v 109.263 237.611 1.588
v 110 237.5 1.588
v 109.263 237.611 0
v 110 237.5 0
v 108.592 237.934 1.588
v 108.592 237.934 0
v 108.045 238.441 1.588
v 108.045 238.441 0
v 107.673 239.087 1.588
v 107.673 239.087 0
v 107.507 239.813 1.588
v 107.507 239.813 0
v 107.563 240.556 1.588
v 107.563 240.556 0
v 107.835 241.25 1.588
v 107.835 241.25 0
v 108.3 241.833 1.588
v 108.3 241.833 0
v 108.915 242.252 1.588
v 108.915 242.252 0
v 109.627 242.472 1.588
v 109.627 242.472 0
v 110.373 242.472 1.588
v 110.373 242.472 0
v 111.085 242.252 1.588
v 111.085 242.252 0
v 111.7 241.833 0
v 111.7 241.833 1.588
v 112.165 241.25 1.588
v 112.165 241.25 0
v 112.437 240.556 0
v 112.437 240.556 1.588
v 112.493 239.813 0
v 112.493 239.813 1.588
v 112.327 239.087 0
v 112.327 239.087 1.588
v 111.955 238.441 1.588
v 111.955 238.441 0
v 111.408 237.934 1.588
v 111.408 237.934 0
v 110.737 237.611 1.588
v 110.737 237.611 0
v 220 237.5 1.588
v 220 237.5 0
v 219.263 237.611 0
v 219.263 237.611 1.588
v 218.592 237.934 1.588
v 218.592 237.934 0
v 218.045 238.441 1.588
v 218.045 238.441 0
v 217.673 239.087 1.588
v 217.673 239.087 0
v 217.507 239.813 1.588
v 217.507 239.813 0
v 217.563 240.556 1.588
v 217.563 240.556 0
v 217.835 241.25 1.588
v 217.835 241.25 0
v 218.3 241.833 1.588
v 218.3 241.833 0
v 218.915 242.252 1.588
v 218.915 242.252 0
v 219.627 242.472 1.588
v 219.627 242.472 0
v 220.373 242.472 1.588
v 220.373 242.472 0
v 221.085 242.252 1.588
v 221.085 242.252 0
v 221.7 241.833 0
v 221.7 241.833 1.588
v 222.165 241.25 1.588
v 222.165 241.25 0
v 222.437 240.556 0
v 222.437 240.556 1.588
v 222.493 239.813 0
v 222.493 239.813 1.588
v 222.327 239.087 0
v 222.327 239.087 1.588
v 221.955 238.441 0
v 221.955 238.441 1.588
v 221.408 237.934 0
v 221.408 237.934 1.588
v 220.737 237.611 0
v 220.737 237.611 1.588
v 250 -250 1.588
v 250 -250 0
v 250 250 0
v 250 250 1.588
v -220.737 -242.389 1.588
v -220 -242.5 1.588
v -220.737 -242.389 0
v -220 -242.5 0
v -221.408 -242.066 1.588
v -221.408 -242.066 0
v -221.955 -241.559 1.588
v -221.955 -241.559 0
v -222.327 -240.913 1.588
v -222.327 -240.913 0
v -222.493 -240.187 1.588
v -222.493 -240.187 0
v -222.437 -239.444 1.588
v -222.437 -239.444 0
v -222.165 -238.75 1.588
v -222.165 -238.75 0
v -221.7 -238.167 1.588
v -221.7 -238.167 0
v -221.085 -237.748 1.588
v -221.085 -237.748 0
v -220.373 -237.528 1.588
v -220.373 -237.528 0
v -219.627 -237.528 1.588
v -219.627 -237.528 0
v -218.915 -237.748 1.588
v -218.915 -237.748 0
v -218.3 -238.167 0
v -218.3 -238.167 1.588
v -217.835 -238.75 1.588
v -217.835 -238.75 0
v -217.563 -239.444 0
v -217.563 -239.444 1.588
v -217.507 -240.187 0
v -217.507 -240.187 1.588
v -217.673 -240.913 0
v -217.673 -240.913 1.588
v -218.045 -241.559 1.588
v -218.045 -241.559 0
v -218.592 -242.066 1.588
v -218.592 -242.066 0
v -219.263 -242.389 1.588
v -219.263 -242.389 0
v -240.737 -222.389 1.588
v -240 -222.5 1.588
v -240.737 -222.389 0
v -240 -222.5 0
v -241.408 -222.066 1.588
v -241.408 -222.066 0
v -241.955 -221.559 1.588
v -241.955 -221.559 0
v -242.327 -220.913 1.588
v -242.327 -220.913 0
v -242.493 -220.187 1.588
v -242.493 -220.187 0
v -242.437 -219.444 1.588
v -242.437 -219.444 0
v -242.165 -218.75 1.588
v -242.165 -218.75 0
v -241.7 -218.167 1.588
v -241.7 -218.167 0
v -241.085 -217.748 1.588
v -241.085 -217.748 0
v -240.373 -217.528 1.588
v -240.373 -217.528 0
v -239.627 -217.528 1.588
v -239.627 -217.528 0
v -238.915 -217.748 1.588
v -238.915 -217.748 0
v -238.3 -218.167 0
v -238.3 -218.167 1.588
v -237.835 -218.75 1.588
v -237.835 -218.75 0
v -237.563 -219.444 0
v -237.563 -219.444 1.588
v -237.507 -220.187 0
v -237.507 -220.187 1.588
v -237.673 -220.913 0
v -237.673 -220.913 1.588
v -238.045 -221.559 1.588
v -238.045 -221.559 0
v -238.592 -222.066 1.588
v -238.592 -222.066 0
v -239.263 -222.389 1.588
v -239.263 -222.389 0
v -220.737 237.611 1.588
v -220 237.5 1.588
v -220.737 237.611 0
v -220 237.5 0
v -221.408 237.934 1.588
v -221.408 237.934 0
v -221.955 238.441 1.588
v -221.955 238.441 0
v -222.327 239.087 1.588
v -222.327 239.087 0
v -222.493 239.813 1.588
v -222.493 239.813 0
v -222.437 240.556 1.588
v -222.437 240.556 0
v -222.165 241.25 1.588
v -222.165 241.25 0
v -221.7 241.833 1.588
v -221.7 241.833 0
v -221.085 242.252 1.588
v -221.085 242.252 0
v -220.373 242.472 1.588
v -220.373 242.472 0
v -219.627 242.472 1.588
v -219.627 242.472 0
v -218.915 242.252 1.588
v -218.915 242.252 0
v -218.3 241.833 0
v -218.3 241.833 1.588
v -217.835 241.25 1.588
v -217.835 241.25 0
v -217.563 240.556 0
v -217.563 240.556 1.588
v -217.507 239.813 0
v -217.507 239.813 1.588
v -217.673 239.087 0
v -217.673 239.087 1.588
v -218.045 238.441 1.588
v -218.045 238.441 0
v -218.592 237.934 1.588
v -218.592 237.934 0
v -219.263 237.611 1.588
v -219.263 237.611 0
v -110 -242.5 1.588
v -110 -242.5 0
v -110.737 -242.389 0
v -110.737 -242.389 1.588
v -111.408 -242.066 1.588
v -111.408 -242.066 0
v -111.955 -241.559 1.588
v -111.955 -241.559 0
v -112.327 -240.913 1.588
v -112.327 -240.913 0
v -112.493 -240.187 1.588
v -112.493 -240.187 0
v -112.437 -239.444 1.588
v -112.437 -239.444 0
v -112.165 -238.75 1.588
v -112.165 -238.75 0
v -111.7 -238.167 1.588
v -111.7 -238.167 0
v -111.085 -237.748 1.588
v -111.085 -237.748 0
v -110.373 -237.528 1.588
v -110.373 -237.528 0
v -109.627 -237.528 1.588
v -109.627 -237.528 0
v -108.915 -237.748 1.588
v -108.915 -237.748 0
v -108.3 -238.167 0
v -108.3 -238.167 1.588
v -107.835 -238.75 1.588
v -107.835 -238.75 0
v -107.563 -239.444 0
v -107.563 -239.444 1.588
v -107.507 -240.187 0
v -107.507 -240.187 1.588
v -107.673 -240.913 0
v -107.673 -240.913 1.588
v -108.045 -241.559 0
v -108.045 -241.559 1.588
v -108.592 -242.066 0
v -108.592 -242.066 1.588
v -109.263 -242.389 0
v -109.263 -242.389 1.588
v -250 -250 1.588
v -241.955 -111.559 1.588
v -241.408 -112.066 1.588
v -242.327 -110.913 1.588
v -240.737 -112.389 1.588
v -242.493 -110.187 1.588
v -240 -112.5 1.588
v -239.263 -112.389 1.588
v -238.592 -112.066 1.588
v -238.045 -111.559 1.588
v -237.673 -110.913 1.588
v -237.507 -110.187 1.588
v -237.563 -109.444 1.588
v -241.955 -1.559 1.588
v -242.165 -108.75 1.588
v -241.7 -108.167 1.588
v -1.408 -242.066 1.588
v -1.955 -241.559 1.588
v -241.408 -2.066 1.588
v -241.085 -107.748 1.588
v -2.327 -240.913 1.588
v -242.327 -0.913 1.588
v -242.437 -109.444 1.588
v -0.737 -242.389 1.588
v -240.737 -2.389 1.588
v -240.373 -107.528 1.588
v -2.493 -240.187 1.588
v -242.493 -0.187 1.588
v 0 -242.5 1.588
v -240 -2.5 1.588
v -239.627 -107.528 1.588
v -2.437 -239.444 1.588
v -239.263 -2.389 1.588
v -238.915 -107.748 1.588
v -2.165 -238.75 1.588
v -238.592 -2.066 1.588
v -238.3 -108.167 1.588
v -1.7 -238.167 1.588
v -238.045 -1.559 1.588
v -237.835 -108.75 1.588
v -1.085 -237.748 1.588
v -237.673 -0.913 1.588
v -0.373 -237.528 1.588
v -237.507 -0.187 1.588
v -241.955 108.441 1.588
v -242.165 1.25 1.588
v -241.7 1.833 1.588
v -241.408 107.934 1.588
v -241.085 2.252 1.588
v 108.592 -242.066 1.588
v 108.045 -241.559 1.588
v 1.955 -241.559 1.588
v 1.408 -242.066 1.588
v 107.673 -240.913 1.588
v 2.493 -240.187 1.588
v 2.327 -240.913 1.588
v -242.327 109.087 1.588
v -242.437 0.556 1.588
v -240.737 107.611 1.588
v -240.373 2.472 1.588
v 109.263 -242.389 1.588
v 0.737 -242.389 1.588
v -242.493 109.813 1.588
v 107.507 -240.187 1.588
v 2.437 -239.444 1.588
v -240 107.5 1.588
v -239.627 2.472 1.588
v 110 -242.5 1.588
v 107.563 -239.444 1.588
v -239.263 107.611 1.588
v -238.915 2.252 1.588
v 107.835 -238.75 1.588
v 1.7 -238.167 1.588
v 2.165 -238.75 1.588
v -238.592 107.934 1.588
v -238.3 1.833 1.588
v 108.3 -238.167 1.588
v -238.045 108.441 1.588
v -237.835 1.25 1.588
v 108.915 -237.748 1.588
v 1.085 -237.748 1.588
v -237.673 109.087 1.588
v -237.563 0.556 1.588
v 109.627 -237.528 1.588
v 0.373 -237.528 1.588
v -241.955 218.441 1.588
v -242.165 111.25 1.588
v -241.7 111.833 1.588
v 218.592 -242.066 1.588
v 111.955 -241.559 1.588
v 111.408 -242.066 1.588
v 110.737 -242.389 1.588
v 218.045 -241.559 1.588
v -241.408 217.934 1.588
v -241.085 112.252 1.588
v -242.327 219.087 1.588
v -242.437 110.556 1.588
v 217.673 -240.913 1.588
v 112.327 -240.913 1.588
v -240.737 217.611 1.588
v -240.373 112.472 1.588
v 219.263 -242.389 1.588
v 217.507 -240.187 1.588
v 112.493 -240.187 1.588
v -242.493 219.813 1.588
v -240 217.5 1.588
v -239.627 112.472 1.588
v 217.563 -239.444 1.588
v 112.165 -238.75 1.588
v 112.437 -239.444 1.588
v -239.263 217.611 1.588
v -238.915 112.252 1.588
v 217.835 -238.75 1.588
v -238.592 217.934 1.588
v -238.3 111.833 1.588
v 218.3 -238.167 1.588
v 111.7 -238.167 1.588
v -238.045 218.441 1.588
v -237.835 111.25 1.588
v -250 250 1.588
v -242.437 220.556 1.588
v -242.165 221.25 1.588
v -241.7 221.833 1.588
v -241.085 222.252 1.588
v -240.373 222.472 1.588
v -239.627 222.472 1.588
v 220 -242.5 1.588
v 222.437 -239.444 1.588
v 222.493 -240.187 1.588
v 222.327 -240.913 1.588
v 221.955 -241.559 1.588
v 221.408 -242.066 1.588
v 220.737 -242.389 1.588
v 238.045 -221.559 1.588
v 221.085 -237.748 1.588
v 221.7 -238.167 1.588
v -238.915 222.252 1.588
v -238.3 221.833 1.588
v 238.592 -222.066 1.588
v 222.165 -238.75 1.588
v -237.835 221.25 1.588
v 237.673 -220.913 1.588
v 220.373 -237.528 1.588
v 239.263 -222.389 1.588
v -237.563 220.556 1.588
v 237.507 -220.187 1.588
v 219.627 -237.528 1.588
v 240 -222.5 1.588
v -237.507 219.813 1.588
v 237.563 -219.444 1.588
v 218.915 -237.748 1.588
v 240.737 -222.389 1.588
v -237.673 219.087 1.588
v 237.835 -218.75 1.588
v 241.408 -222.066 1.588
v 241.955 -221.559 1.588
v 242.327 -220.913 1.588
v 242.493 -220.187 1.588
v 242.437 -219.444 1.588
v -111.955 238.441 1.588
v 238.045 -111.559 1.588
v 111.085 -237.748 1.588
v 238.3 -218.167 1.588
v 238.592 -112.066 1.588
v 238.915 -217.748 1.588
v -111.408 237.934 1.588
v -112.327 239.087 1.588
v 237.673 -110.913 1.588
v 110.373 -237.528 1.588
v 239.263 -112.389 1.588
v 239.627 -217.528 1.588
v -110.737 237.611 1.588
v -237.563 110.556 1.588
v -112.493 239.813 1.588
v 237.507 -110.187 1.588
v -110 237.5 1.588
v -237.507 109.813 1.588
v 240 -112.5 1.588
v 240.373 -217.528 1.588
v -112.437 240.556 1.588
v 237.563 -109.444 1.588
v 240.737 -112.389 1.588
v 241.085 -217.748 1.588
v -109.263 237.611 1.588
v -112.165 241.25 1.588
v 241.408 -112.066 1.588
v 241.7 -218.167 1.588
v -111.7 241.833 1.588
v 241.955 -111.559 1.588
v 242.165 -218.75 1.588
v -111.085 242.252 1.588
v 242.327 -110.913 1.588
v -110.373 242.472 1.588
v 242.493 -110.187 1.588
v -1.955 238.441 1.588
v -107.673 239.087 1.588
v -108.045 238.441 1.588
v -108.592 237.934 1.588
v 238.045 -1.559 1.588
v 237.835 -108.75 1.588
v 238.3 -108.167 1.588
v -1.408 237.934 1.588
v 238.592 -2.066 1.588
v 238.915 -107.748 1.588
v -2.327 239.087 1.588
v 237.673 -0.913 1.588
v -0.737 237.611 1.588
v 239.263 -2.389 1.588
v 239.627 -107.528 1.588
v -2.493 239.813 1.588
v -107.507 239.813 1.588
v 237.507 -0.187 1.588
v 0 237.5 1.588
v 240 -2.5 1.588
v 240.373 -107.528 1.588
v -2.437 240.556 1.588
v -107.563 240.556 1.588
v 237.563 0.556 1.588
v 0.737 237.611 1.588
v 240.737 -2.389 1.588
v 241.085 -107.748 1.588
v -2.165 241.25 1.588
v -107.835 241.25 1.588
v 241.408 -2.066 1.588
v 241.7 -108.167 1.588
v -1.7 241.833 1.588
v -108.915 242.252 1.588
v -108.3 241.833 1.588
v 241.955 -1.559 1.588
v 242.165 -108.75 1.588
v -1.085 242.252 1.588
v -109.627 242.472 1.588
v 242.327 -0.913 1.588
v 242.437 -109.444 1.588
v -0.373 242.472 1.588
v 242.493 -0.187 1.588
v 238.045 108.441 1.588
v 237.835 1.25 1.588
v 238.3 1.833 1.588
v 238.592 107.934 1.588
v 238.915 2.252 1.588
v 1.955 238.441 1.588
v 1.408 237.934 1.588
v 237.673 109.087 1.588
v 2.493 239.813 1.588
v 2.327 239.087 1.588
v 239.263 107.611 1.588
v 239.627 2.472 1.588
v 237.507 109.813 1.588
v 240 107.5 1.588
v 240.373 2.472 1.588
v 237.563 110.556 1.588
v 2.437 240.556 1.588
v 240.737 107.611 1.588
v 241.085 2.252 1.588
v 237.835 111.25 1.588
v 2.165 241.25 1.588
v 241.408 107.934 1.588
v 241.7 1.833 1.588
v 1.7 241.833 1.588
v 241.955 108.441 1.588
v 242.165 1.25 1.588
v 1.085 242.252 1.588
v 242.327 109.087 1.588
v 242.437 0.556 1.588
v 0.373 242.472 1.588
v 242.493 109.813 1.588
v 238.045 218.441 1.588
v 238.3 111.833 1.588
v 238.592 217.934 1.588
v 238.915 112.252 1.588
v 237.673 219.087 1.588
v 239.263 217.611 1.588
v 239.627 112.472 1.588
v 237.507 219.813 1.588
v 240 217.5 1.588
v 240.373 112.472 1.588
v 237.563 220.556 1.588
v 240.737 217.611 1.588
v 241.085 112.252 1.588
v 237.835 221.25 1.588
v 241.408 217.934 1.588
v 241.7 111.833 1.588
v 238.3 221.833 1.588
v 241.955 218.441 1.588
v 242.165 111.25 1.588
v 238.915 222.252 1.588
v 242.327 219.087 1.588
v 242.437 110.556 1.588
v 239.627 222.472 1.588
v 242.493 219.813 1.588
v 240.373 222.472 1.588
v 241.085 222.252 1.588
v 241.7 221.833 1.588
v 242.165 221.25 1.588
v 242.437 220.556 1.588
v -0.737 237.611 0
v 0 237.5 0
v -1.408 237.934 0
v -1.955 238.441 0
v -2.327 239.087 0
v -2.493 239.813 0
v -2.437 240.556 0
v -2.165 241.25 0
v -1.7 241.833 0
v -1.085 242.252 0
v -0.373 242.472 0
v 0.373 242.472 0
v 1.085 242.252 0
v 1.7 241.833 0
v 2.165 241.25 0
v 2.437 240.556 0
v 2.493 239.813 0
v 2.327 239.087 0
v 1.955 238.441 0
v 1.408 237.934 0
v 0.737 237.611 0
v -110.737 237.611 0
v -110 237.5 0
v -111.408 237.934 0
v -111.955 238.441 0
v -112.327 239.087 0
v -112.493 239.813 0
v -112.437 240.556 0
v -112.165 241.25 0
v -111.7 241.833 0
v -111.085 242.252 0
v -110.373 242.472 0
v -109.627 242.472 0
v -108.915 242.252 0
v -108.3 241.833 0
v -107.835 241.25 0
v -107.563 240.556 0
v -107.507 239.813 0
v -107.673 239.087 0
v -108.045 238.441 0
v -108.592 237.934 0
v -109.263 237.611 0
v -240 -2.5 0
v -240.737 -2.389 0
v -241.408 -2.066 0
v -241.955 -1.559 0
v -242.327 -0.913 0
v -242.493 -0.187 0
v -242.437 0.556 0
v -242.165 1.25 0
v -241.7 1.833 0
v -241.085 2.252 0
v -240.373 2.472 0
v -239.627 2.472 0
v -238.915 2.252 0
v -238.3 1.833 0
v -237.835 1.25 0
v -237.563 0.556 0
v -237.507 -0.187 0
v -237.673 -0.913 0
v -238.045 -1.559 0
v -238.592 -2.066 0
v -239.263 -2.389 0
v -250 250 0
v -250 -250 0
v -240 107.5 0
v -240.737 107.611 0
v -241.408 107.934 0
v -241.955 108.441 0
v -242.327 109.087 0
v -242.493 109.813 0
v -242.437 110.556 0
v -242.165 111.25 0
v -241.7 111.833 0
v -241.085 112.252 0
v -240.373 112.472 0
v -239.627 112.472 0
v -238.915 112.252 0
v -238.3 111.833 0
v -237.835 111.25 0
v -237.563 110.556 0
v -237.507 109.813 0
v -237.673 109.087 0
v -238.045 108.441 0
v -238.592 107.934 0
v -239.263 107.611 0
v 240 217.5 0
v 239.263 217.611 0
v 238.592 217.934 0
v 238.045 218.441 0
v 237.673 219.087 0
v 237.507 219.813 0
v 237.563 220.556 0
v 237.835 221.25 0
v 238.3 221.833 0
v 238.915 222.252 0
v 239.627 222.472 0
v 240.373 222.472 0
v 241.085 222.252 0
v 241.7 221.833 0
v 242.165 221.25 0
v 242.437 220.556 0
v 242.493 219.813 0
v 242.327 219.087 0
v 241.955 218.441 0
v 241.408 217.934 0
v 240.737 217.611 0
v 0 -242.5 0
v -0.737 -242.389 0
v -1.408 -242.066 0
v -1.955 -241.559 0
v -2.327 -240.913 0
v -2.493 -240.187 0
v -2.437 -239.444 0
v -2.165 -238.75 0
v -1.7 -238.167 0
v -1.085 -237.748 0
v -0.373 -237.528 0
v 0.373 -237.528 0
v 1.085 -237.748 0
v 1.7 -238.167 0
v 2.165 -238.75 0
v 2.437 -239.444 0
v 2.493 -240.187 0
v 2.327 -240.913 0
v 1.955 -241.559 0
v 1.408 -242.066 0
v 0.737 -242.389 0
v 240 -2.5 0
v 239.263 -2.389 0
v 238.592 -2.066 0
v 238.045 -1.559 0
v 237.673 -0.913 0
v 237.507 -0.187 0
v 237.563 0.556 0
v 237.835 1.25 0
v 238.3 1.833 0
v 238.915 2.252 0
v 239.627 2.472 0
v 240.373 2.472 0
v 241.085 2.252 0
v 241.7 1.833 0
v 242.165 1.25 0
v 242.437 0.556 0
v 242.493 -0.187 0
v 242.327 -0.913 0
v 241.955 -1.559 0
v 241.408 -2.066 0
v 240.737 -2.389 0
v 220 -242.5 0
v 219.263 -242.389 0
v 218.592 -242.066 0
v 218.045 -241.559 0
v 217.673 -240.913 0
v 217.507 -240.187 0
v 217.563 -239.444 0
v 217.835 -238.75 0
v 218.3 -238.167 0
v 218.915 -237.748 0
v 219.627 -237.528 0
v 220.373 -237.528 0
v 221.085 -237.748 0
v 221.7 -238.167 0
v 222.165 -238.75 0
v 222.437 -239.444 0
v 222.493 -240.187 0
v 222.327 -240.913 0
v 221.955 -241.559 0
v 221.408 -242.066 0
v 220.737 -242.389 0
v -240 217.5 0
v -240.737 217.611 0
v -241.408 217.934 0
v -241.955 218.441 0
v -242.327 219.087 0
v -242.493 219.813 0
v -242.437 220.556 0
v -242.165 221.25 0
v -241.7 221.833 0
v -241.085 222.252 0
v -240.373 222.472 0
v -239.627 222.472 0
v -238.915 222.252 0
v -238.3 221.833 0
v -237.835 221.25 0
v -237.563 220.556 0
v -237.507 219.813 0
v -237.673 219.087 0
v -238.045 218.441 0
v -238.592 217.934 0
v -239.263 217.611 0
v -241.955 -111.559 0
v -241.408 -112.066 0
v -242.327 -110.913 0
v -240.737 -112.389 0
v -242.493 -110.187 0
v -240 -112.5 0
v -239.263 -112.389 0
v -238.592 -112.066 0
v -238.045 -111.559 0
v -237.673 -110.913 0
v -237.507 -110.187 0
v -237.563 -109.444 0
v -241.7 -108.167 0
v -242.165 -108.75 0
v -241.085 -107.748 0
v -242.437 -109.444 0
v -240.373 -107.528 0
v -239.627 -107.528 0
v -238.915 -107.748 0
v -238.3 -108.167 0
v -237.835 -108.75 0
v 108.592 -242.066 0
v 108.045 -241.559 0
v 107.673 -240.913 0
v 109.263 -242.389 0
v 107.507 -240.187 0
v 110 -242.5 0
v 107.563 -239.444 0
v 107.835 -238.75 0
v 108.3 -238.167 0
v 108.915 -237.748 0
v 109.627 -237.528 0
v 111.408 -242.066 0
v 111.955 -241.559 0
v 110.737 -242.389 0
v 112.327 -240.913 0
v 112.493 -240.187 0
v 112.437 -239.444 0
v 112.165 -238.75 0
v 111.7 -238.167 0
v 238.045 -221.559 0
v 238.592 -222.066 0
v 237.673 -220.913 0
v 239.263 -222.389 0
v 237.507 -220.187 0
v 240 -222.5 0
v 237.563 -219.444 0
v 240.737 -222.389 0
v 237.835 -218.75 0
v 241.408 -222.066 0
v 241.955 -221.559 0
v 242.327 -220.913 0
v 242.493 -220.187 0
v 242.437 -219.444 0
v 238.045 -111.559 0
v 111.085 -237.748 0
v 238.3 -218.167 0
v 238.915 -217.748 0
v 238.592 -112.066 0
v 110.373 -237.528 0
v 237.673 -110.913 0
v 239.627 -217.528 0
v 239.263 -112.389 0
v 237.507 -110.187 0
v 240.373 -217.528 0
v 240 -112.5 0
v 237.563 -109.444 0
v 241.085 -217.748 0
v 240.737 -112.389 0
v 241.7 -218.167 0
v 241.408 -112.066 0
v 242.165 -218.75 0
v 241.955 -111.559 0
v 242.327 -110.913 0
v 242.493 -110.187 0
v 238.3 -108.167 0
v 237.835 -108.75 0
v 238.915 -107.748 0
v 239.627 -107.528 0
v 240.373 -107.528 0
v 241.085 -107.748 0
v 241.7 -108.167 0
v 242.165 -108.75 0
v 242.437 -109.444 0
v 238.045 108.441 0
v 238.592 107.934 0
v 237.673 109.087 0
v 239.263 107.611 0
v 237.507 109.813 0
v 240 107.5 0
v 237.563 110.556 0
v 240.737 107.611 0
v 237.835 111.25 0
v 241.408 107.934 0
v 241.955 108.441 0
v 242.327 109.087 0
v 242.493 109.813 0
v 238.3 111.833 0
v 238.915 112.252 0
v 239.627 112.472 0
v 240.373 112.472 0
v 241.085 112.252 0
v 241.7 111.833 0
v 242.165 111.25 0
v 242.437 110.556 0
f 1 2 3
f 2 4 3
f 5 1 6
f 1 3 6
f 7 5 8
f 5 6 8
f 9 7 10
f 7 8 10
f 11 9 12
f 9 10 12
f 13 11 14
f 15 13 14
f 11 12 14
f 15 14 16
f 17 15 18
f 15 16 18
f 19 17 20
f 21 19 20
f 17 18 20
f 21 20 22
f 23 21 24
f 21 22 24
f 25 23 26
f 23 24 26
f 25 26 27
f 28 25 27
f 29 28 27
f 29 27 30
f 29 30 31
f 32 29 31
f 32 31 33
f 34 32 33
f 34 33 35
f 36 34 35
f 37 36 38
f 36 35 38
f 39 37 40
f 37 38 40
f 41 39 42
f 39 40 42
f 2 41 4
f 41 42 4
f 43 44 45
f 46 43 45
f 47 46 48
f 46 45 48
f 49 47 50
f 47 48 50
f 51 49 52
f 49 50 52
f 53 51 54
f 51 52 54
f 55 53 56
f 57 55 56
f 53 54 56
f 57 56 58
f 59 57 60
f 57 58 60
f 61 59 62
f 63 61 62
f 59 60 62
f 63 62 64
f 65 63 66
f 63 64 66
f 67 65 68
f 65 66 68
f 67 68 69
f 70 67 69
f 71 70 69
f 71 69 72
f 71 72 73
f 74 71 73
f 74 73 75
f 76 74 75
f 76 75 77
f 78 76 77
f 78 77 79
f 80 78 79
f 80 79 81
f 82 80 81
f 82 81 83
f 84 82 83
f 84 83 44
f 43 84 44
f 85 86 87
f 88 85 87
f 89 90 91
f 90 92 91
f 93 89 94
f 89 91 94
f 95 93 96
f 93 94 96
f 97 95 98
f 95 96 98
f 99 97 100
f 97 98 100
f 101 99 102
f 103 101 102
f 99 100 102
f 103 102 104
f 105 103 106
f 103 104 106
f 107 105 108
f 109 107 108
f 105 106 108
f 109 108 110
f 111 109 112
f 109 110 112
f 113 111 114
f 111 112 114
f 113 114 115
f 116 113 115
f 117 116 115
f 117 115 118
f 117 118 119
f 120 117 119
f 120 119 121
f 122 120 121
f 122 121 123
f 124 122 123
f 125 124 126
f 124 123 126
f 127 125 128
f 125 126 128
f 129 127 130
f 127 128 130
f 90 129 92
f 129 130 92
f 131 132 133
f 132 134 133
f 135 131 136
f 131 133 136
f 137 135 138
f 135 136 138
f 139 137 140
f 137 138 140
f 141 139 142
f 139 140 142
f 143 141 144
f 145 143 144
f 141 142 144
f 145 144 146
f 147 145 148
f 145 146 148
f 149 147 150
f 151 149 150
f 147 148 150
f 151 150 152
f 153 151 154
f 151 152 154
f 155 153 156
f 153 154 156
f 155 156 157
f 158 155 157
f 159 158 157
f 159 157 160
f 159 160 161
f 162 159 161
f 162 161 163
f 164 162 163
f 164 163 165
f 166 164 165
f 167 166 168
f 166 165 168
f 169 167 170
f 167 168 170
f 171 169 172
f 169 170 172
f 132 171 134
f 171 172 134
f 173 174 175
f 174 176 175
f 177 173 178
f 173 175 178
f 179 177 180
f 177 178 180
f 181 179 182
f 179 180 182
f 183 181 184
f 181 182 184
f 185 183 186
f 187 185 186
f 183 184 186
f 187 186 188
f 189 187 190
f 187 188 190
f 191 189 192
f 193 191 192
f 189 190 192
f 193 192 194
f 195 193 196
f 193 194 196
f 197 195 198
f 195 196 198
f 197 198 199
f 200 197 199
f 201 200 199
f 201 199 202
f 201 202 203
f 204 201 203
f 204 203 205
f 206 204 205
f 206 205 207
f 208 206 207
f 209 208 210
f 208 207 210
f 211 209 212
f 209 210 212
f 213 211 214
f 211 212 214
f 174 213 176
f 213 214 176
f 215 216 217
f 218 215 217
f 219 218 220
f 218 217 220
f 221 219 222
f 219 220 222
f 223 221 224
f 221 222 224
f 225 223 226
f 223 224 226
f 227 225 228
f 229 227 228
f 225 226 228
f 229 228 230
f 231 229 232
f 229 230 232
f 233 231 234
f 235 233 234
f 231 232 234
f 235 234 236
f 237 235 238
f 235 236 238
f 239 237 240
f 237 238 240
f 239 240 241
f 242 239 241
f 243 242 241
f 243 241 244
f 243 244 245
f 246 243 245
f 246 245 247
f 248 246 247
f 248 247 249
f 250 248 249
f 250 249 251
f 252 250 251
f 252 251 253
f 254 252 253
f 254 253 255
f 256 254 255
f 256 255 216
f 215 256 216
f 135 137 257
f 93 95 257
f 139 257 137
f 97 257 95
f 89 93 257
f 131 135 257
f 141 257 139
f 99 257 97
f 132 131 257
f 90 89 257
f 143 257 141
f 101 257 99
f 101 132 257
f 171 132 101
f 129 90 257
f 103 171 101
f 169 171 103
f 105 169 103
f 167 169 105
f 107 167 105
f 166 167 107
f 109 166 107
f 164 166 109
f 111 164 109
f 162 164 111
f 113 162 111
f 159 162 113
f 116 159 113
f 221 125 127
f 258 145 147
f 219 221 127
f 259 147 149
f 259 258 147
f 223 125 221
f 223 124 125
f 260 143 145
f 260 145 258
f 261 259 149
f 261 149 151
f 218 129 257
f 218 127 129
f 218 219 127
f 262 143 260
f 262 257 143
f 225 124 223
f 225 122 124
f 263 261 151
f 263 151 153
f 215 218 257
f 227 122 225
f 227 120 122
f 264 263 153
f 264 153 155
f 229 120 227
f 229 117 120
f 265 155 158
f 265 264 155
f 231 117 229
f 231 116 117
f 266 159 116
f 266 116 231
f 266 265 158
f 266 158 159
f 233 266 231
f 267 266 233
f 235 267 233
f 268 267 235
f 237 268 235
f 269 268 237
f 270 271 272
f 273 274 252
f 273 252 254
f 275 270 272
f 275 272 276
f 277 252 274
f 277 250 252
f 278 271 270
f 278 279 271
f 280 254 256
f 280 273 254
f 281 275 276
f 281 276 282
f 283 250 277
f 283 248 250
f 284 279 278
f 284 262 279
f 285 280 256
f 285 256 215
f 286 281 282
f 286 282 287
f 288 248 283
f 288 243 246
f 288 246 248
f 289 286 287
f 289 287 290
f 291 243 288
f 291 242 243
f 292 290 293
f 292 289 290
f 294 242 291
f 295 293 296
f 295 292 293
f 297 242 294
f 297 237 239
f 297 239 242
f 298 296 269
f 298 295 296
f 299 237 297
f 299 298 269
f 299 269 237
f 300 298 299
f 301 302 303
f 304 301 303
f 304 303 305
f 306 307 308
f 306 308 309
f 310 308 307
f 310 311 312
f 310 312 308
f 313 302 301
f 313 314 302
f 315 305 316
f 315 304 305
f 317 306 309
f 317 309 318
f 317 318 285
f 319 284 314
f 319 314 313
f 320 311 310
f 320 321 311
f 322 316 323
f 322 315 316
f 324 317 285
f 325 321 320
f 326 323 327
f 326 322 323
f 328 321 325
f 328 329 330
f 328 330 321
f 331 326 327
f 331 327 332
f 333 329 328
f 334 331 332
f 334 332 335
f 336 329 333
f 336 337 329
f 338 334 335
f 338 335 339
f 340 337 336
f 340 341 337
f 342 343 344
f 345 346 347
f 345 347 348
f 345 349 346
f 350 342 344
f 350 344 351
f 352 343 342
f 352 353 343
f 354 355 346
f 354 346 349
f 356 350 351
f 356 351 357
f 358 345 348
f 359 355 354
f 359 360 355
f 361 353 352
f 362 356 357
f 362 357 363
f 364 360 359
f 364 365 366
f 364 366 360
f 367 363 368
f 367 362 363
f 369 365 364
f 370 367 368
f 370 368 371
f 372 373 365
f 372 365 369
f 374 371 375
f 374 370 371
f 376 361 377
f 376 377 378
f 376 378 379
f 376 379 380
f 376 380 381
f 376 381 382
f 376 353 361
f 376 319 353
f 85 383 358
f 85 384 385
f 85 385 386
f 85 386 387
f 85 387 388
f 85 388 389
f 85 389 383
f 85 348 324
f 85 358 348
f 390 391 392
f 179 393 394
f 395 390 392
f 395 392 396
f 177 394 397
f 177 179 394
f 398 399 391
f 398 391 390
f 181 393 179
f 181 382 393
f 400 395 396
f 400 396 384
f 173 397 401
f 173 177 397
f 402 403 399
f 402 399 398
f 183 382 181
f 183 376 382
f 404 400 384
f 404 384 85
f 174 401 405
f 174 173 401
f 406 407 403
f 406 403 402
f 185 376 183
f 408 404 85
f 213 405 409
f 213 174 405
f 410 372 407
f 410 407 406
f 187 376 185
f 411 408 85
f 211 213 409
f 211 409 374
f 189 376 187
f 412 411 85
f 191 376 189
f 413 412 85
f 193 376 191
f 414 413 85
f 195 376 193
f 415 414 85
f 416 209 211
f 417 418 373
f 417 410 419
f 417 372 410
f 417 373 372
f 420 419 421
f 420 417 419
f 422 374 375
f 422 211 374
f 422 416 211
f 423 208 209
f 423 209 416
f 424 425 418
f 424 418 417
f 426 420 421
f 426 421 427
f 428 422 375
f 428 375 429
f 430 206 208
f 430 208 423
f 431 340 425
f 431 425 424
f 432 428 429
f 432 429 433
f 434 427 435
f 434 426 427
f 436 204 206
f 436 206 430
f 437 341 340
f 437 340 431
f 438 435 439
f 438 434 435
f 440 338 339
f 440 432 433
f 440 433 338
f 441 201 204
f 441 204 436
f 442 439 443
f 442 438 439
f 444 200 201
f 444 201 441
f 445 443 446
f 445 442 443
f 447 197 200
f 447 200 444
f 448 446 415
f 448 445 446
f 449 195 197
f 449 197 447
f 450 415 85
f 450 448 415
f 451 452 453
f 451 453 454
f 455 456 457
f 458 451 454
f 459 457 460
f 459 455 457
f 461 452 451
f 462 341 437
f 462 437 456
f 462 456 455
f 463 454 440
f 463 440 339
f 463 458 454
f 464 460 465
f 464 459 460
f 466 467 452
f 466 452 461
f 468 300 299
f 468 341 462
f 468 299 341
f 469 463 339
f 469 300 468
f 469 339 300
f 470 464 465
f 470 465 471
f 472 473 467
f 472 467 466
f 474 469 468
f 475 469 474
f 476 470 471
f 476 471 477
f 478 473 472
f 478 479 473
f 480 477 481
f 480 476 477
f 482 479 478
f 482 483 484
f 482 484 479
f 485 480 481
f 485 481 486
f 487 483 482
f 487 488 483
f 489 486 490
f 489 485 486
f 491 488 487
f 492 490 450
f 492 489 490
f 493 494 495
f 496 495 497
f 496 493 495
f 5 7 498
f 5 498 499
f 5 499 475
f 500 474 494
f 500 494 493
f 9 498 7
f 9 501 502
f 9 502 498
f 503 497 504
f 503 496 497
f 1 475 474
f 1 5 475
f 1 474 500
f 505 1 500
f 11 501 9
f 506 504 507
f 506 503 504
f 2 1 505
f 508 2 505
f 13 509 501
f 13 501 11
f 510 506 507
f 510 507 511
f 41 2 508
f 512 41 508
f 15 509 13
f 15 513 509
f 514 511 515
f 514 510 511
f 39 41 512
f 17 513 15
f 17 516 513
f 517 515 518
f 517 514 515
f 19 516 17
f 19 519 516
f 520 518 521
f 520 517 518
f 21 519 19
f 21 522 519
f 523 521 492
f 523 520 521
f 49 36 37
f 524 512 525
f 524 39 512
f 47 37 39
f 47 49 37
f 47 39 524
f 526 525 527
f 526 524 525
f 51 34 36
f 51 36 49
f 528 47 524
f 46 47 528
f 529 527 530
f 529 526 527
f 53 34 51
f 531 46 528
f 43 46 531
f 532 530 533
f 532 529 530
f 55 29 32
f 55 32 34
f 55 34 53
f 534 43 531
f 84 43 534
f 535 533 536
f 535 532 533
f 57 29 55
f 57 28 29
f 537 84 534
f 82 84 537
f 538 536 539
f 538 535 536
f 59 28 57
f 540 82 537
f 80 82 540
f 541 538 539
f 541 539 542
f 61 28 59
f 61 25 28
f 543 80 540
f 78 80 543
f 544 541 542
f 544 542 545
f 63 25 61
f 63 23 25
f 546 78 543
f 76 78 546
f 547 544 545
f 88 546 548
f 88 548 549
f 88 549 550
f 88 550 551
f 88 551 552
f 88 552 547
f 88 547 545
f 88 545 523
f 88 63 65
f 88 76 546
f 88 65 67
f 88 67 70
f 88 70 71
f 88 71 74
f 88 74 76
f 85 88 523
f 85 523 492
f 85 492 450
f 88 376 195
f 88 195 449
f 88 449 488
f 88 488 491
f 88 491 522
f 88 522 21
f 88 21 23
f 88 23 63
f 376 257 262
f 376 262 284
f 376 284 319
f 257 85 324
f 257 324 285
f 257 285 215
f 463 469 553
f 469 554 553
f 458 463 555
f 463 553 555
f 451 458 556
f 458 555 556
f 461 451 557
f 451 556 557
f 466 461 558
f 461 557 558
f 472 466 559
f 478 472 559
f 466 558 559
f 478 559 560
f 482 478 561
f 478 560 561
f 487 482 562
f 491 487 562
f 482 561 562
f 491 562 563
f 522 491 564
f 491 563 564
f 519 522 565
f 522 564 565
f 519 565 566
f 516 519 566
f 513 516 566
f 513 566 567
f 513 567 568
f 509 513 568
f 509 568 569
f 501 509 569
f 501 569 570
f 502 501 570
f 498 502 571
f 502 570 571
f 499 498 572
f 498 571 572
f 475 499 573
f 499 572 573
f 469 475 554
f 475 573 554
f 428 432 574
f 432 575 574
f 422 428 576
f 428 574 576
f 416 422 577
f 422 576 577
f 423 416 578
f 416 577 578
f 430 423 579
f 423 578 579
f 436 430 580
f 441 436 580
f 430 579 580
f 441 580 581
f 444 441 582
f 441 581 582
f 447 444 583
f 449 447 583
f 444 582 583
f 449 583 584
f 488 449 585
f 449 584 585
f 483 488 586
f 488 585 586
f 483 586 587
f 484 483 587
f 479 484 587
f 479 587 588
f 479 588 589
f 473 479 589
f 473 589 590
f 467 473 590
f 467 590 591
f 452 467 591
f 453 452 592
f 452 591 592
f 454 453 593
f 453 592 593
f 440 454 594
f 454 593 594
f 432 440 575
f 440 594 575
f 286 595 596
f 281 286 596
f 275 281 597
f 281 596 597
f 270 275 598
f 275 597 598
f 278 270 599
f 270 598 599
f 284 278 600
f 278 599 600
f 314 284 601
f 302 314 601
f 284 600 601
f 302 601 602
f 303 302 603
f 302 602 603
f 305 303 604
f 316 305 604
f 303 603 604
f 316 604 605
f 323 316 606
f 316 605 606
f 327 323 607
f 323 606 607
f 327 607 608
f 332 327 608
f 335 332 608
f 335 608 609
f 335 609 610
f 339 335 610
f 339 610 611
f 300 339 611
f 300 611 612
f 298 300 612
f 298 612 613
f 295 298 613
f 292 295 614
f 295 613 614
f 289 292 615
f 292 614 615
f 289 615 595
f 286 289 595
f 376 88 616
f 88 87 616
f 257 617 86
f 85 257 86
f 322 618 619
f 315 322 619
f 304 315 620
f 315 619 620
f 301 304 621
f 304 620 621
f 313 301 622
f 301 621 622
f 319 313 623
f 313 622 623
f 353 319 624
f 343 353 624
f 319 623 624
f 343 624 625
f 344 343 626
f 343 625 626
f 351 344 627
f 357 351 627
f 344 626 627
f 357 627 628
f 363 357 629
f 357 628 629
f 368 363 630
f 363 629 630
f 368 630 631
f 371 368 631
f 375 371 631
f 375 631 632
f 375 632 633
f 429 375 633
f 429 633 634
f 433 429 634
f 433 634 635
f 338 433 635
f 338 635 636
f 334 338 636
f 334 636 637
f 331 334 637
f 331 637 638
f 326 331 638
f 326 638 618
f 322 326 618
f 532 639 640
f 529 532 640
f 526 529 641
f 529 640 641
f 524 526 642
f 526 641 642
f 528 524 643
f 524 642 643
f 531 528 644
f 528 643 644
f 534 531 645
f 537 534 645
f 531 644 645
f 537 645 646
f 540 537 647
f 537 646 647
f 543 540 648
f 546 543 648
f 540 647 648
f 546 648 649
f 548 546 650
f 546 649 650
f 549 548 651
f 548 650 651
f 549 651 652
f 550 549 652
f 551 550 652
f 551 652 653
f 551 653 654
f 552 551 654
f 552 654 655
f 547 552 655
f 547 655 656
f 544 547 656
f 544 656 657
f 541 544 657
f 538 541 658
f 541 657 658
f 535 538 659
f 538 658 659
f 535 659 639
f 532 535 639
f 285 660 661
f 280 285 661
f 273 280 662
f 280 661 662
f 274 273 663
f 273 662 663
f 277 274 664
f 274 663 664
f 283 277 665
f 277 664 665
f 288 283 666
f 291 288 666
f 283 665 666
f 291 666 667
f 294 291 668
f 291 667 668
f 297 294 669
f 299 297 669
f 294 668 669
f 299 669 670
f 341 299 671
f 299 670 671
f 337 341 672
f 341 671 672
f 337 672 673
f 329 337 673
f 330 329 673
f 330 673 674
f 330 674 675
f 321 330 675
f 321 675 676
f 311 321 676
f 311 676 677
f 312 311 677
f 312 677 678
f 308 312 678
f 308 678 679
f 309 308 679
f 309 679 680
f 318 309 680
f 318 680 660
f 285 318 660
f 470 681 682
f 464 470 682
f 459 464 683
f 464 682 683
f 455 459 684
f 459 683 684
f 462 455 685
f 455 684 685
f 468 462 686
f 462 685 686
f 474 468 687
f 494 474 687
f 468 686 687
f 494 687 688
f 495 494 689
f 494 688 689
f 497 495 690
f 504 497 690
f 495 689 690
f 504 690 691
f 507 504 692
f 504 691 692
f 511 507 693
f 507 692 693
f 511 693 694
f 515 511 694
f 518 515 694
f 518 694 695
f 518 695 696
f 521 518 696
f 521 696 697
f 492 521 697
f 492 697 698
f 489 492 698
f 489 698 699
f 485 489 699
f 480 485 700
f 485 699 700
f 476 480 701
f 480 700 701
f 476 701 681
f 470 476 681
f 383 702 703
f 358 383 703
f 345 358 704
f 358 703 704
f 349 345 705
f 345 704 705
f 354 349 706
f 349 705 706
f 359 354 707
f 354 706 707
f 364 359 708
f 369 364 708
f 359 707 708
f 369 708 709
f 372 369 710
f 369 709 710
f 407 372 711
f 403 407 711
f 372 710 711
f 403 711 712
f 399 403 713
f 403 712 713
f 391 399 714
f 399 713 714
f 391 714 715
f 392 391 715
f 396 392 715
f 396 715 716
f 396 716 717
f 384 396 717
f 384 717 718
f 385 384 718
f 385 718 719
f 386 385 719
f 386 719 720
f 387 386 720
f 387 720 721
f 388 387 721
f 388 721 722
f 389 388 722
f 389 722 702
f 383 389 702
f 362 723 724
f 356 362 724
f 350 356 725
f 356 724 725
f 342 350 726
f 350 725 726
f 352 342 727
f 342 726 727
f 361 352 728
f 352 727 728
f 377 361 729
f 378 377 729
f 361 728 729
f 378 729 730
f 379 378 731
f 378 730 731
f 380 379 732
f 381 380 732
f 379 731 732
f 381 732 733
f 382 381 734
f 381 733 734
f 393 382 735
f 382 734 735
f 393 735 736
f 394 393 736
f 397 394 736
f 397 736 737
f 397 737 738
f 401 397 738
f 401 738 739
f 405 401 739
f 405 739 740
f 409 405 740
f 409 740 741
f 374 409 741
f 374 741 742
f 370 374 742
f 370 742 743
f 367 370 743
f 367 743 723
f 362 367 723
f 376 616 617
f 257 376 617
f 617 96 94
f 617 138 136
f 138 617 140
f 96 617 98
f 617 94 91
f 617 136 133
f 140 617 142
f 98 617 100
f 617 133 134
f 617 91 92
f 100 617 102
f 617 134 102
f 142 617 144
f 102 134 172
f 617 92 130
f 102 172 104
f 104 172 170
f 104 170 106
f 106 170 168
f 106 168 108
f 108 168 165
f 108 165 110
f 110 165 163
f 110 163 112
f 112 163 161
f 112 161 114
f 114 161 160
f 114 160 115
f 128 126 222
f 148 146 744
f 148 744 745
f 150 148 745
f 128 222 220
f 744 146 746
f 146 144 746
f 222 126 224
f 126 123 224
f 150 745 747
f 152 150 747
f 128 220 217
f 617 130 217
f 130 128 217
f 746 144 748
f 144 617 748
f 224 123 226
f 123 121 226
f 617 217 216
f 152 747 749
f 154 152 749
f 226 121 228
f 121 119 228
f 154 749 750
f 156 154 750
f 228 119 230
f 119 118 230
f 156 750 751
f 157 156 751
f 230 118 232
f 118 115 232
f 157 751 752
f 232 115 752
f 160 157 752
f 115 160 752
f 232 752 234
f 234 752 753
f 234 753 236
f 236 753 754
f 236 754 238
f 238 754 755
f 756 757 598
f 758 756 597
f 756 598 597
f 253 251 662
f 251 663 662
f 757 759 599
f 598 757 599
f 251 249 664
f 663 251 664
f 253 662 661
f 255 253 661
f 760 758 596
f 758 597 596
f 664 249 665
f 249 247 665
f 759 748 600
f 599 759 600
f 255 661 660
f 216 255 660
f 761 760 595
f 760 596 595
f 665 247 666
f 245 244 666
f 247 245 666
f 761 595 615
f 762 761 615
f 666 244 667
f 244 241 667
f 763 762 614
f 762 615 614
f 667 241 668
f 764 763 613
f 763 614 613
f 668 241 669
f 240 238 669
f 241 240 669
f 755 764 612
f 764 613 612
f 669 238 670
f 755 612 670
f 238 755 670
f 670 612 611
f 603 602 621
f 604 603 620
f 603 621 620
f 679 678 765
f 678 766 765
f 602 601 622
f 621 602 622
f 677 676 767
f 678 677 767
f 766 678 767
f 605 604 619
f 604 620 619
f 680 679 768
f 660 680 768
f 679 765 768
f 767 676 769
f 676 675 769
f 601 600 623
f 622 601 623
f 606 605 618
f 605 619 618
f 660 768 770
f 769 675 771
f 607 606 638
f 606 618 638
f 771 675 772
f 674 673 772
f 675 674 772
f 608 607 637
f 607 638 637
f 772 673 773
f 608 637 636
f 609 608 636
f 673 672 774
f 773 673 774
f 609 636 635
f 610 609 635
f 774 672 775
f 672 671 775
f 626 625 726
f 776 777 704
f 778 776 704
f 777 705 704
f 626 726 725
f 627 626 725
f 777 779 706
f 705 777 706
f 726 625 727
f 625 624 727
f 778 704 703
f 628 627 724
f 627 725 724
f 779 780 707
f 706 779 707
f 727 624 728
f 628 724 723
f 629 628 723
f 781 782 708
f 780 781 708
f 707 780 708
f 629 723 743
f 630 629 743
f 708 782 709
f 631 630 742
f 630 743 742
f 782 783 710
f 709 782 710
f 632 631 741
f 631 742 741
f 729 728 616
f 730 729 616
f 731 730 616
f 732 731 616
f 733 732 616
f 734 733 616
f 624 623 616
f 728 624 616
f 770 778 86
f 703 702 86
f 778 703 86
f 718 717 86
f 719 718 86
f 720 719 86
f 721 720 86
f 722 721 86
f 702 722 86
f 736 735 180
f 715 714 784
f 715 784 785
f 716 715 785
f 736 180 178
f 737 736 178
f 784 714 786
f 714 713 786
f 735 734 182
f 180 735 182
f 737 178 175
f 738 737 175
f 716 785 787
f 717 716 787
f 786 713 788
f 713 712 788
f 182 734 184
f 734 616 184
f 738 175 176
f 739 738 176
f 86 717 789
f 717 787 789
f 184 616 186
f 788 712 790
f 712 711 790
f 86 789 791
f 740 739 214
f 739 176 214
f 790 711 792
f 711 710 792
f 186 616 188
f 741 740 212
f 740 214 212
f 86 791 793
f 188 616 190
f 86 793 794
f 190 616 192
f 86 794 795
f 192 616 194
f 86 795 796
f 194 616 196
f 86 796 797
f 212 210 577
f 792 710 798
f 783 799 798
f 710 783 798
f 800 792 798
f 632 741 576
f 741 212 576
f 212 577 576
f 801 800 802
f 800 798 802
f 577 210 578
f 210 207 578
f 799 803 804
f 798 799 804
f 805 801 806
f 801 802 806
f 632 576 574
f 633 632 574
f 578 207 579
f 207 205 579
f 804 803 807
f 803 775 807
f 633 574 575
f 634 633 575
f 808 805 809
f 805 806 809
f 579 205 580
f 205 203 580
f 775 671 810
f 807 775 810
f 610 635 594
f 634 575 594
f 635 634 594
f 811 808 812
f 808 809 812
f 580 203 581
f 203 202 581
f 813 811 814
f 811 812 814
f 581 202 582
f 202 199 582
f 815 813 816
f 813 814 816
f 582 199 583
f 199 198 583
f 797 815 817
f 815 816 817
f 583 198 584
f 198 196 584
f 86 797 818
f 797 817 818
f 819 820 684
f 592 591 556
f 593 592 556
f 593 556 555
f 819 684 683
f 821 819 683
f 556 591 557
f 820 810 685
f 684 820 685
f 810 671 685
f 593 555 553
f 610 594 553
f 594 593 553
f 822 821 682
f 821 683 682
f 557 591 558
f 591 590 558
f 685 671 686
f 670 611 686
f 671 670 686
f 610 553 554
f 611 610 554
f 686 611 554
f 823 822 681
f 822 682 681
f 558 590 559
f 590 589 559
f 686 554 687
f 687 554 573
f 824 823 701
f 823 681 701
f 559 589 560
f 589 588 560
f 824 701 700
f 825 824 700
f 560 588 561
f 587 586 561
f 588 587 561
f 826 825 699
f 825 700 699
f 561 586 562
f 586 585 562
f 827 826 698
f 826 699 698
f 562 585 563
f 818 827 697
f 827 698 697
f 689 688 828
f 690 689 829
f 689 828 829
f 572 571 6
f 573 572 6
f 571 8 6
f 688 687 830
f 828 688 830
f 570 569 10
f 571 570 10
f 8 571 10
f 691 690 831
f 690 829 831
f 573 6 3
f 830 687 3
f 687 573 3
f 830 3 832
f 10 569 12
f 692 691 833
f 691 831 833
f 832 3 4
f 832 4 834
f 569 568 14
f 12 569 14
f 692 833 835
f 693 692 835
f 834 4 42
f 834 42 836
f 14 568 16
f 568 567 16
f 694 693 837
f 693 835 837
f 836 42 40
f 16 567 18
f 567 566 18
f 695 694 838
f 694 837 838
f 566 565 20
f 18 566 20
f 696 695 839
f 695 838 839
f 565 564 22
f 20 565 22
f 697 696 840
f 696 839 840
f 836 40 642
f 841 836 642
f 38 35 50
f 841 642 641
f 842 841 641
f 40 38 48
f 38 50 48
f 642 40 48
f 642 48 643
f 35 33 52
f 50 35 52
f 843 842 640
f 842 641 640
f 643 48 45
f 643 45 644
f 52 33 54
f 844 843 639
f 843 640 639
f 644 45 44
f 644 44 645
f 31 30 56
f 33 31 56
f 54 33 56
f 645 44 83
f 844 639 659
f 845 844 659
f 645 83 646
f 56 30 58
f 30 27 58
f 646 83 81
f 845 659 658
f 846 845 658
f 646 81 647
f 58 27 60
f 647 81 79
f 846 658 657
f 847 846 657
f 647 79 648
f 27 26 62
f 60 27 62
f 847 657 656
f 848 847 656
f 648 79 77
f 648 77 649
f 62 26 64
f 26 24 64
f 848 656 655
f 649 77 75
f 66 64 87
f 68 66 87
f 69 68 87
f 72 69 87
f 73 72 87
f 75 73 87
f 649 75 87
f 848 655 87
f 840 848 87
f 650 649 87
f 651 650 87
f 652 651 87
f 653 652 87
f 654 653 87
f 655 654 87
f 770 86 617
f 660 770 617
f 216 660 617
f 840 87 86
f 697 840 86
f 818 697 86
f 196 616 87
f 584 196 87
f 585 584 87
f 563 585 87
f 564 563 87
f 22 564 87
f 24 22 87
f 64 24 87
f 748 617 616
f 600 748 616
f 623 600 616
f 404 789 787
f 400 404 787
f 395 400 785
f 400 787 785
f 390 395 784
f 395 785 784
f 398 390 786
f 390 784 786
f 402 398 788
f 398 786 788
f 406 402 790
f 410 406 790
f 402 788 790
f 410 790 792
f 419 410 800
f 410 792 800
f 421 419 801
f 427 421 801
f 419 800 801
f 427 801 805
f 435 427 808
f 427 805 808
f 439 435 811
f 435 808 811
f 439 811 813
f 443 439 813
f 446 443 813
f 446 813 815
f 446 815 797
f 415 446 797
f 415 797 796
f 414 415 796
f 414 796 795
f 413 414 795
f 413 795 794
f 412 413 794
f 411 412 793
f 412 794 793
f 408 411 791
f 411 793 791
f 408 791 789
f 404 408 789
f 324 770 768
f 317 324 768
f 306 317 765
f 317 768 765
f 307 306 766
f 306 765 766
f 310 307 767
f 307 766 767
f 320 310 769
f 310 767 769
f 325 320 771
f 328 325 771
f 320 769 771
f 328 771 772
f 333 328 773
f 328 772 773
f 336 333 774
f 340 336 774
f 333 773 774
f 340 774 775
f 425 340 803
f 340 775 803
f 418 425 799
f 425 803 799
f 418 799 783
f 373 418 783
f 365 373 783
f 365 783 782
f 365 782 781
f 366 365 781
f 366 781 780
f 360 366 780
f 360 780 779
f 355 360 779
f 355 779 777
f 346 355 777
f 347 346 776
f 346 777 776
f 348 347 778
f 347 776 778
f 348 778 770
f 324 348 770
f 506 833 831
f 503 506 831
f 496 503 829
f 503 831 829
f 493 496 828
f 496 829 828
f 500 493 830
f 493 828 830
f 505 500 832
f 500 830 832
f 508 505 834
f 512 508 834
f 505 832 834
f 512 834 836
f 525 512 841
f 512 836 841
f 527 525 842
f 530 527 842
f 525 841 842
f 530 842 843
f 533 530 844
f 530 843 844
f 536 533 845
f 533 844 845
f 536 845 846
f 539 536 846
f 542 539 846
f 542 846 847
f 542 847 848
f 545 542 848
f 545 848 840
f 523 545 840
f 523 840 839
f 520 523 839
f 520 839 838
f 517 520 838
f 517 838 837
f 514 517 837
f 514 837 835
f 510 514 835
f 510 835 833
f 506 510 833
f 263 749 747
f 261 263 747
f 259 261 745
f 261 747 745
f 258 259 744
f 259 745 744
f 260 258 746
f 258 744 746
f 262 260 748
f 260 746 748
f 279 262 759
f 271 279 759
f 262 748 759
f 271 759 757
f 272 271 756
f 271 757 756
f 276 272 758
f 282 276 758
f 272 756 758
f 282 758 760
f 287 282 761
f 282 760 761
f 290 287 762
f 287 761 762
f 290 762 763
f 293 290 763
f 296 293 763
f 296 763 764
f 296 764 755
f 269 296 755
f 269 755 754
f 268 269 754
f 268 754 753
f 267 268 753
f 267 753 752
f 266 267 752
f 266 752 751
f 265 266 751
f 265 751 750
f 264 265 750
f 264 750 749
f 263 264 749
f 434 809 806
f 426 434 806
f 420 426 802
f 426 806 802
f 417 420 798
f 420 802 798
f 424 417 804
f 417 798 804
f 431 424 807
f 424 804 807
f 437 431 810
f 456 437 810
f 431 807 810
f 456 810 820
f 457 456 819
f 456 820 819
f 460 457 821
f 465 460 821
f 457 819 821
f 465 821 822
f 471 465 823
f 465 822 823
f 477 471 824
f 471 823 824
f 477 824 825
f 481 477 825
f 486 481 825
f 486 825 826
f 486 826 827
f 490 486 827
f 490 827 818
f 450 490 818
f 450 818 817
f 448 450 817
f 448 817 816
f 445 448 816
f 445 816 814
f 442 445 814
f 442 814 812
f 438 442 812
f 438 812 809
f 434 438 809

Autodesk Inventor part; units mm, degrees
ref_plane "YZ Plane" through (0, 0, 0) normal (1, 0, 0) x (0, 1, 0)
ref_plane "XZ Plane" through (0, 0, 0) normal (0, 1, 0) x (-1, 0, 0)
ref_plane "XY Plane" through (0, 0, 0) normal (0, 0, 1) x (1, 0, 0)
sketch "Sketch1" plane through (0, 0, 0) normal (0, 0, 1) x (1, 0, 0)
  line L0 (-250, -250) -> (250, -250)
  line L1 (250, -250) -> (250, 250)
  line L2 (250, 250) -> (-250, 250)
  line L3 (-250, 250) -> (-250, -250)
  line L4 (-250, -250) -> (250, 250) construction
  line L5 (250, -250) -> (-250, 250) construction
  point P0 (0, 0)
  dimension "d0" = 500
  dimension "d1" = 500
extrude "Extrusion1" add sketch "Sketch1" along normal blind 1.5875
sketch "Sketch2" plane through (0, 0, 1.5875) normal (0, 0, 1) x (1, 0, 0)
  line L0 (-250, -250) -> (250, -250) projected
  line L1 (250, -250) -> (250, 250) projected
  line L2 (250, 250) -> (-250, 250) projected
  line L3 (-250, 250) -> (-250, -250) projected
  point P0 (0, 0)
  point P1 (-220, 240)
  dimension "d4" = 10
  dimension "d5" = 30
hole "Hole1" at (-220, 240, 1.5875) direction (0, 0, -1) diameter 5 end through all
pattern_linear "Rectangular Pattern1" count 5 spacing 110 along (1, 0, 0) count 2 spacing 480 along (0, -1, 0) of "Hole1"
sketch "Sketch3" plane through (0, 0, 1.5875) normal (0, 0, 1) x (1, 0, 0)
  circle A0 centre (220, -240) radius 2.5 projected
  circle A1 centre (110, -240) radius 2.5 projected
  circle A2 centre (0, -240) radius 2.5 projected
  circle A3 centre (-110, -240) radius 2.5 projected
  circle A4 centre (-220, -240) radius 2.5 projected
  circle A5 centre (220, 240) radius 2.5 projected
  circle A6 centre (110, 240) radius 2.5 projected
  circle A7 centre (0, 240) radius 2.5 projected
  circle A8 centre (-110, 240) radius 2.5 projected
  circle A9 centre (-220, 240) radius 2.5 projected
  line L0 (-250, -250) -> (250, -250) projected
  line L1 (250, -250) -> (250, 250) projected
  line L2 (250, 250) -> (-250, 250) projected
  line L3 (-250, 250) -> (-250, -250) projected
  point P0 (0, 0)
  point P1 (-240, 220)
  dimension "d19" = 10
  dimension "d20" = 30
hole "Hole2" at (-240, 220, 1.5875) direction (0, 0, -1) diameter 5 end through all
pattern_linear "Rectangular Pattern2" count 5 spacing 110 along (0, -1, 0) count 2 spacing 480 along (1, 0, 0) of "Hole2"
properties part number "Face B Felt" material "Nylon 6/6"
